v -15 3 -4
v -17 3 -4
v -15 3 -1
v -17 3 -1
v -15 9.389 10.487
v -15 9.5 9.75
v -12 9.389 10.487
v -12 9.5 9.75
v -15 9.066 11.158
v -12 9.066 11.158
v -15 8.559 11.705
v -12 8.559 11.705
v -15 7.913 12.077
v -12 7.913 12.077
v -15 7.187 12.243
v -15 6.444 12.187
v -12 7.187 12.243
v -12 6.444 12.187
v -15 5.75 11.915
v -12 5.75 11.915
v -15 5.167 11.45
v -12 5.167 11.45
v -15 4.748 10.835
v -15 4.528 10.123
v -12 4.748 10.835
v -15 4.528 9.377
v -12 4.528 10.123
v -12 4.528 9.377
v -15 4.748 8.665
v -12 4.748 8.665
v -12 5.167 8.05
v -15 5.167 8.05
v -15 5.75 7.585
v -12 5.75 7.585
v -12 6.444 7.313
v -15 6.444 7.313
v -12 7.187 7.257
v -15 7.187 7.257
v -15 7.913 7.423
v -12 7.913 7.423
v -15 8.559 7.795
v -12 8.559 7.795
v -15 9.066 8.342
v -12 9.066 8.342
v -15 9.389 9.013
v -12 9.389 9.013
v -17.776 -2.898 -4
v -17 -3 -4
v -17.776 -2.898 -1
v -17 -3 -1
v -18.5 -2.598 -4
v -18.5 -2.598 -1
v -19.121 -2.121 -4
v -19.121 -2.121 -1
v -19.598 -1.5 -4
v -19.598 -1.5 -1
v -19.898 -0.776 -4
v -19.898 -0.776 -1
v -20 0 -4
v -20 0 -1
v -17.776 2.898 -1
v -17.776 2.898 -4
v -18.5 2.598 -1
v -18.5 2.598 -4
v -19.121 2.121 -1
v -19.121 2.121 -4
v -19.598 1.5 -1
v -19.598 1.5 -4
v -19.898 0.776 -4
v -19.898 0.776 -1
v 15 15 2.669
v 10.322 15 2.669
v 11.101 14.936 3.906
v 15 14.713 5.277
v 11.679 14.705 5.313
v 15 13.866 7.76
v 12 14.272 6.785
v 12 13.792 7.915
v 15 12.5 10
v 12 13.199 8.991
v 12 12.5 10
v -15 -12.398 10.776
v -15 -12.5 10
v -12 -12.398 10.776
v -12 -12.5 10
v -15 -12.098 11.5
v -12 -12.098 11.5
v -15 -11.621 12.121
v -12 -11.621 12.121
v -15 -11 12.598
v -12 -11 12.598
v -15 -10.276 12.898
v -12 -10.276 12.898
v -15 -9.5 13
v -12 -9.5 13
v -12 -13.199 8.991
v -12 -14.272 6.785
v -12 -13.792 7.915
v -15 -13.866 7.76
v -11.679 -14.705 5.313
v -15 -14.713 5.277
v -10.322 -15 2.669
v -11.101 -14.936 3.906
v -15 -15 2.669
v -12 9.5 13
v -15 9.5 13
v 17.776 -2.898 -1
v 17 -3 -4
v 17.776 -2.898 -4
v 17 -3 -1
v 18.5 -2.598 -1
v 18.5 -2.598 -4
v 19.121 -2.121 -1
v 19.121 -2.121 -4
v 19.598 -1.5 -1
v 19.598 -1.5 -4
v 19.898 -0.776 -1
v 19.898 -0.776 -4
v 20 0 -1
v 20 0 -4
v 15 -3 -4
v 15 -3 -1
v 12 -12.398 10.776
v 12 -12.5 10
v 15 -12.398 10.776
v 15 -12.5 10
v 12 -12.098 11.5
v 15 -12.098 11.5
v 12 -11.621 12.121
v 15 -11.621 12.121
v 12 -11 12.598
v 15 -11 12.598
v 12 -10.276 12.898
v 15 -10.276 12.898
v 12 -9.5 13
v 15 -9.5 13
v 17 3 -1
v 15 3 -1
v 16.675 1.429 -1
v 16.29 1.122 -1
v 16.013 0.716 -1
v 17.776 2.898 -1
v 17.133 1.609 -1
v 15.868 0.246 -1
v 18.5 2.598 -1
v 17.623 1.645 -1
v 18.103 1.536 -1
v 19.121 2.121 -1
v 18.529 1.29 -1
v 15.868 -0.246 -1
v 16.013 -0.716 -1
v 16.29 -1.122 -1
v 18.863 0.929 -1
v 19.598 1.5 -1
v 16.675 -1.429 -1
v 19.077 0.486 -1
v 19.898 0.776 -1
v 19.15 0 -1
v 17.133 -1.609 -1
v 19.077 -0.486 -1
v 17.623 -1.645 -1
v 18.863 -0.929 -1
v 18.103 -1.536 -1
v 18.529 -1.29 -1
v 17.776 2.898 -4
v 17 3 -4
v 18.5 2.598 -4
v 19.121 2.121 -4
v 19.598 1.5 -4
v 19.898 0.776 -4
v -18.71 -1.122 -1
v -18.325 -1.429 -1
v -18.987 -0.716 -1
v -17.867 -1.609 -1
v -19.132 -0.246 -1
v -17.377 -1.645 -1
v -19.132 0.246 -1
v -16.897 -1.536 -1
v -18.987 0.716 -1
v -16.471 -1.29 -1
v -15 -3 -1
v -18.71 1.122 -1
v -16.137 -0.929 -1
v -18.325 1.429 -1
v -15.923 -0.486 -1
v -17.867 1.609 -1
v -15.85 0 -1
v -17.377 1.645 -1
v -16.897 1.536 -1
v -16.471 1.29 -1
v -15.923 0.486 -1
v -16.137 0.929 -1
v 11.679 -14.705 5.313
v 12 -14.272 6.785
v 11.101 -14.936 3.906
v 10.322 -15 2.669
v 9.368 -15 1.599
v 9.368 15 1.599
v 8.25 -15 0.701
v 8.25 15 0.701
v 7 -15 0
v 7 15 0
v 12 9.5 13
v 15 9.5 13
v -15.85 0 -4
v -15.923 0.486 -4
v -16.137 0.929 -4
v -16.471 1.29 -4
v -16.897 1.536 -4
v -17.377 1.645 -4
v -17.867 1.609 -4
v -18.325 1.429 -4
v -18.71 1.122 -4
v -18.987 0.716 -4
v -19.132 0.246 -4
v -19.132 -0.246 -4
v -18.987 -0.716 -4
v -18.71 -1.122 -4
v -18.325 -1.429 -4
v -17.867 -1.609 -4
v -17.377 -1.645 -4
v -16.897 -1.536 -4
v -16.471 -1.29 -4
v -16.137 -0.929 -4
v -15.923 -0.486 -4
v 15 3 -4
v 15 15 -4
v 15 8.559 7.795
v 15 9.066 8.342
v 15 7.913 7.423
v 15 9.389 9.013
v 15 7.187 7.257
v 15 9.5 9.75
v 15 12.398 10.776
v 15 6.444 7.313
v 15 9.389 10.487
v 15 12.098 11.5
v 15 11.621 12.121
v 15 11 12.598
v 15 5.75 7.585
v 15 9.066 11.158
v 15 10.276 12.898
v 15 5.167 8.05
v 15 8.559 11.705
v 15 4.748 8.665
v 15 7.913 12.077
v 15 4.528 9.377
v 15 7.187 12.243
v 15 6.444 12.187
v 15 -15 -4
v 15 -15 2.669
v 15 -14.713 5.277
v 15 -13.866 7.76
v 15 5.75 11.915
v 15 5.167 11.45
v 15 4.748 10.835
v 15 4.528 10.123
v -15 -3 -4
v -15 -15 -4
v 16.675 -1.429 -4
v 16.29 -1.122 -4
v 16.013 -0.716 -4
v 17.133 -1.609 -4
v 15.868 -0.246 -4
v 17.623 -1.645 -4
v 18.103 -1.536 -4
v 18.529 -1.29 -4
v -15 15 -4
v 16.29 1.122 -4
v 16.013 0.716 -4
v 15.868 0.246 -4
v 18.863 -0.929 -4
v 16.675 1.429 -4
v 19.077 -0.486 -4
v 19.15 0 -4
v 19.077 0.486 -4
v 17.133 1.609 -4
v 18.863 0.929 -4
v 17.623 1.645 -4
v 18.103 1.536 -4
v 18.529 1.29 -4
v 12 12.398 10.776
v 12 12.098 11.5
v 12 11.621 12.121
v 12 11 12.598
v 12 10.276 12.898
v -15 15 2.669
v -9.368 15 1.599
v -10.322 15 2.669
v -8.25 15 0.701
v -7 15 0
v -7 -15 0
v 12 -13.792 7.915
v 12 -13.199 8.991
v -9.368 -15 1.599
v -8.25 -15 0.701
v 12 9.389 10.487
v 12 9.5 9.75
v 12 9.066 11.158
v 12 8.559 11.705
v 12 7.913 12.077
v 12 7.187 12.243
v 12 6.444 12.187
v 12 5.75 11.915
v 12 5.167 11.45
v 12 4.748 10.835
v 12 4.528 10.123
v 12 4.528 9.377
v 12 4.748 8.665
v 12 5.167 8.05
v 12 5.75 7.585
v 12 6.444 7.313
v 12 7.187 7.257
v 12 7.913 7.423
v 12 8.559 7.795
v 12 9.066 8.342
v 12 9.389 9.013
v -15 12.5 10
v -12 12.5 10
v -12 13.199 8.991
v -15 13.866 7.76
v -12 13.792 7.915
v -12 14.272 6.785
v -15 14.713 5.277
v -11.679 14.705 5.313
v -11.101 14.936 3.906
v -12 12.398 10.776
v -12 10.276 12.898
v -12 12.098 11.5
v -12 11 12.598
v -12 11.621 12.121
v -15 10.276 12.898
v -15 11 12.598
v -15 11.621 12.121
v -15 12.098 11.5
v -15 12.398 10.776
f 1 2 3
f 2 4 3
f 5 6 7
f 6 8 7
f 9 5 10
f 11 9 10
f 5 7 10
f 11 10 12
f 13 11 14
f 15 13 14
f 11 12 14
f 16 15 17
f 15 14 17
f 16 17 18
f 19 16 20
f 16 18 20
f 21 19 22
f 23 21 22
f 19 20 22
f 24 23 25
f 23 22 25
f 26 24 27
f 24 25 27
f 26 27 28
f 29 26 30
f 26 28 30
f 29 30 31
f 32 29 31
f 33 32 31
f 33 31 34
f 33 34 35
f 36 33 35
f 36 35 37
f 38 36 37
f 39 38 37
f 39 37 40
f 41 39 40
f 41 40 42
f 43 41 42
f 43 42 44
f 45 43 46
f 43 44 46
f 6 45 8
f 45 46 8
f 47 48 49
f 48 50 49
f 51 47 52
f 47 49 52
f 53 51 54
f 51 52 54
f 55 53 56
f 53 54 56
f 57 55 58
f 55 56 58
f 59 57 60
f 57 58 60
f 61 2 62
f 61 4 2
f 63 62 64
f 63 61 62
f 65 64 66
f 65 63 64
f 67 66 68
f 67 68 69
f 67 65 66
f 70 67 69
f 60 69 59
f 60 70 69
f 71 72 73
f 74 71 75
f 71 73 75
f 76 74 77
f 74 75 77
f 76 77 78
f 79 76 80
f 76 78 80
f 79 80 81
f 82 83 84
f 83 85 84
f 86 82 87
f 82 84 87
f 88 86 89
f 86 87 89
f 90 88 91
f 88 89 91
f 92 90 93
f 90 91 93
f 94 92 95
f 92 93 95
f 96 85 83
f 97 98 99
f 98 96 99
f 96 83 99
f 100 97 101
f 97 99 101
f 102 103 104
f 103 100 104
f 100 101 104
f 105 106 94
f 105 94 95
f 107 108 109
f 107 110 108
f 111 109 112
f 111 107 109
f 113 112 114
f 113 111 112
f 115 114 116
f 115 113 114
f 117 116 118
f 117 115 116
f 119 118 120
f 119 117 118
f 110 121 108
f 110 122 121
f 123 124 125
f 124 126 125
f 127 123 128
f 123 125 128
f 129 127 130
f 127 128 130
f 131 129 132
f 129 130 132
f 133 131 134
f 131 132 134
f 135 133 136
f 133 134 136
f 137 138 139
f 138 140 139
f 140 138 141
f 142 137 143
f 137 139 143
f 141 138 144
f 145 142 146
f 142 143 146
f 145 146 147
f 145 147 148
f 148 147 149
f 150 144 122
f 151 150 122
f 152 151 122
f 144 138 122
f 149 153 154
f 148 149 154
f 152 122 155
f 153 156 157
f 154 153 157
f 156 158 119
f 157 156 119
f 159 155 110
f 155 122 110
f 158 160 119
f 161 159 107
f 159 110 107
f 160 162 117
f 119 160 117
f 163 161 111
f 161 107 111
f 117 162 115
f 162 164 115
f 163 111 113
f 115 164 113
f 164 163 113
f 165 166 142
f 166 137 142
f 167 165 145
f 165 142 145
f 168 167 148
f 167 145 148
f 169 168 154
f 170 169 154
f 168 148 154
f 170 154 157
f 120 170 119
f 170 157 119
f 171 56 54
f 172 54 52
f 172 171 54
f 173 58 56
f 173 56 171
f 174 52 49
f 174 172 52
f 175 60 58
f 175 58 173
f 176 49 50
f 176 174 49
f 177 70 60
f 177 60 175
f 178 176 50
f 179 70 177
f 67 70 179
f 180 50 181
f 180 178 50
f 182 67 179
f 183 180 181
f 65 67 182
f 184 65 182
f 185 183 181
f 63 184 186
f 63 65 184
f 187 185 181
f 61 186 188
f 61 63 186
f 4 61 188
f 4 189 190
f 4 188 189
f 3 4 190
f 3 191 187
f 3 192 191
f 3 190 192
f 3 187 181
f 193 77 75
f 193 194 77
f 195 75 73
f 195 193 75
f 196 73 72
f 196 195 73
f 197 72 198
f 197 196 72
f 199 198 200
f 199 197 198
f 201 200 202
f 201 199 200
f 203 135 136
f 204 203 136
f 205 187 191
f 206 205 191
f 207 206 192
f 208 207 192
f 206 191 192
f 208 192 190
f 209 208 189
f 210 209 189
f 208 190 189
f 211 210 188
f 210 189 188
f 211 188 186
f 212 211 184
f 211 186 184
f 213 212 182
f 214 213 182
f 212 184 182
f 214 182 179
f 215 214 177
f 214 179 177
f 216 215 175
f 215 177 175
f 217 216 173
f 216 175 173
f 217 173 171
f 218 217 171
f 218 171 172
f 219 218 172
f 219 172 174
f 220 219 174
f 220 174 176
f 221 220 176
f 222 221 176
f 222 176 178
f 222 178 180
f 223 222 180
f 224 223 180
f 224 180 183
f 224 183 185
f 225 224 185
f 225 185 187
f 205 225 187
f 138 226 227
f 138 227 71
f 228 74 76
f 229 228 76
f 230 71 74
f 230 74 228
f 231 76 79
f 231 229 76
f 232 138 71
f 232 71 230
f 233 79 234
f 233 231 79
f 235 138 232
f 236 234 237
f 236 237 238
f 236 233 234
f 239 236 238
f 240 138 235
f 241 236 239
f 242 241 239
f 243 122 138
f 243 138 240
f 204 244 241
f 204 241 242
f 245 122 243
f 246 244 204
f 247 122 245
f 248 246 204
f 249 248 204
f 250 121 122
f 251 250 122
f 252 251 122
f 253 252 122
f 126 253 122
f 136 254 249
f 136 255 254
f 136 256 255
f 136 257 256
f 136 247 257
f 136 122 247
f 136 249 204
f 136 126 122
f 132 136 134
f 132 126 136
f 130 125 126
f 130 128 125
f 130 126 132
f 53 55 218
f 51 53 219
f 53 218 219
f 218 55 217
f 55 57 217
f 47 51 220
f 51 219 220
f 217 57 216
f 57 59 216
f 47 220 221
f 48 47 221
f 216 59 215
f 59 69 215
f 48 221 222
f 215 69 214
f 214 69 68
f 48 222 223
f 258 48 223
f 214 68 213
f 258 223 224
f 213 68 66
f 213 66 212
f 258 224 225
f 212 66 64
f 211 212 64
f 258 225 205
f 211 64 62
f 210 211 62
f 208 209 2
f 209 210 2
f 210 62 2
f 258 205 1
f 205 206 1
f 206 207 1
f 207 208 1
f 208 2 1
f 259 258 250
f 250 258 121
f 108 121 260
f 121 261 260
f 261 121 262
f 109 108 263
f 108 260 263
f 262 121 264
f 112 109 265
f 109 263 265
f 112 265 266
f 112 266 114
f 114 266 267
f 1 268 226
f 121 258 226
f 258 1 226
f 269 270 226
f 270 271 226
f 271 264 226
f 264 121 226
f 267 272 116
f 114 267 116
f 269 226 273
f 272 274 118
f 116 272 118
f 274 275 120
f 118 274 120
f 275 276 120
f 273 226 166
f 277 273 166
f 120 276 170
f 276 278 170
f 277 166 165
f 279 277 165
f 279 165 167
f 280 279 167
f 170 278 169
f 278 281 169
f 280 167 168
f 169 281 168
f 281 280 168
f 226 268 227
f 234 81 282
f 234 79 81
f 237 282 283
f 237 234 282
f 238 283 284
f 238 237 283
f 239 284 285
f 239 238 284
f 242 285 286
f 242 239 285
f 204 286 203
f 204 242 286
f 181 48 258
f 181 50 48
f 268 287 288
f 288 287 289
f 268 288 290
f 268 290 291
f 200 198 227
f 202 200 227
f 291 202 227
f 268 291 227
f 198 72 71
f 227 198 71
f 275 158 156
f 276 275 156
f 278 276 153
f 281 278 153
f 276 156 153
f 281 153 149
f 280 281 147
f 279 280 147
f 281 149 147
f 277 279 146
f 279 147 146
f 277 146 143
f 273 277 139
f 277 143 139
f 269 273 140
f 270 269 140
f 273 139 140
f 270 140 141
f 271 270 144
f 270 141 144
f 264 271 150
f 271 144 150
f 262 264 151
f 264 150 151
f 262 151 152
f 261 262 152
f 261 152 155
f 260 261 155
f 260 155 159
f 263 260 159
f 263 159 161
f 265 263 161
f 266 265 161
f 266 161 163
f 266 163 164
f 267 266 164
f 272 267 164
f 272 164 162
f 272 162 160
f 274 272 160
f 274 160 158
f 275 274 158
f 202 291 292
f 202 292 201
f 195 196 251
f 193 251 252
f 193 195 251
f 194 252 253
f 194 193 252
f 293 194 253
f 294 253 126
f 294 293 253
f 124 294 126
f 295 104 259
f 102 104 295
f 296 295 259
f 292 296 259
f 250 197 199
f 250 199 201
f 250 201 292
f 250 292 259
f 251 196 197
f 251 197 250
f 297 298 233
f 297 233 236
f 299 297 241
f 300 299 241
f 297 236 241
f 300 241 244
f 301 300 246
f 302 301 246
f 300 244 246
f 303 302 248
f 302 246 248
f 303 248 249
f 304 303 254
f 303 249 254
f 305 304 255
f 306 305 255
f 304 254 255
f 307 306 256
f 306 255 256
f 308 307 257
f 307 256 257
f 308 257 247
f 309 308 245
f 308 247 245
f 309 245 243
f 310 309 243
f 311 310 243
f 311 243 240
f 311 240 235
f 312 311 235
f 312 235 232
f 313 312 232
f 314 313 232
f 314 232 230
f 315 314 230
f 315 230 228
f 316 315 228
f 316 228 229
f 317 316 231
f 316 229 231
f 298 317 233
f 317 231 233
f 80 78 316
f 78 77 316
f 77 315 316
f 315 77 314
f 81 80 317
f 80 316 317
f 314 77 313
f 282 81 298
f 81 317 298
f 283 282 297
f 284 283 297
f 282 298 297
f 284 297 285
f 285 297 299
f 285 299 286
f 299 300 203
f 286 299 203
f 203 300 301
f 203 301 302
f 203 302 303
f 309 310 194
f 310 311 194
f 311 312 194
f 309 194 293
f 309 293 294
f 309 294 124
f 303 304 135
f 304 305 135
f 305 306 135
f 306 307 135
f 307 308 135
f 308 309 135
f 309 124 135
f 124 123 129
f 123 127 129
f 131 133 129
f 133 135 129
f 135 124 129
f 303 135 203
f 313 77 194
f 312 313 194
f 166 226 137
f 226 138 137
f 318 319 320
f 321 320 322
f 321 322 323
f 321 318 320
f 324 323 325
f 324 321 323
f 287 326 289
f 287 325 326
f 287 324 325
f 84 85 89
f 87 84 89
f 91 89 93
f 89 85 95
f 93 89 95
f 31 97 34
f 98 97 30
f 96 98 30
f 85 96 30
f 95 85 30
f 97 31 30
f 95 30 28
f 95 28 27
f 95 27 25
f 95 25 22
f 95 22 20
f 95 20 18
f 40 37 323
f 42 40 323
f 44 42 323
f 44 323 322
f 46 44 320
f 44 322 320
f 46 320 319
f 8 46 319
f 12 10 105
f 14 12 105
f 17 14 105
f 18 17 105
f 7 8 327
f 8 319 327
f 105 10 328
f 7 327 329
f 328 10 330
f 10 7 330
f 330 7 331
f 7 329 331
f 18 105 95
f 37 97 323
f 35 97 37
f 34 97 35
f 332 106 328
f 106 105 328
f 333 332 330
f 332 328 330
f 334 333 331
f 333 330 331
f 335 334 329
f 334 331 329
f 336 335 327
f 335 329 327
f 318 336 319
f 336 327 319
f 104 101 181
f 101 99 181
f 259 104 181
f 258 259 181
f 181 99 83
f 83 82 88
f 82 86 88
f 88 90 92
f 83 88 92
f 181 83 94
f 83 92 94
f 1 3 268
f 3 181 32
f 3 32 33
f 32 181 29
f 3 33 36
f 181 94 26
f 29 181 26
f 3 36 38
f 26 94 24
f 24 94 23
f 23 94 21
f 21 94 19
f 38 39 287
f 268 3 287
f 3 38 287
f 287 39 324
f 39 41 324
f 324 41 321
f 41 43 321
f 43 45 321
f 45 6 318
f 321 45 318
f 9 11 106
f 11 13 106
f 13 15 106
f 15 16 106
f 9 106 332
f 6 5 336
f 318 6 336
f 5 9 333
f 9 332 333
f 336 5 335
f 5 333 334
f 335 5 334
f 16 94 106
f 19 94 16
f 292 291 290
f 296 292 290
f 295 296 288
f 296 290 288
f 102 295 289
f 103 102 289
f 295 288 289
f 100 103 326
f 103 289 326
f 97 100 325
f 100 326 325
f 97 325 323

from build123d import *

# Parameters (mm, degrees)
F0_W         = 30
F0_H         = 30
F1_DEPTH     = 4
F2_W         = 3
F2_H         = 10
F3_DEPTH     = 15
F5_DEPTH     = 15
F6_W         = 5
F6_H         = 3
F7_DEPTH     = 3
F8_R         = 2.99999
F9_R         = 1.65
F10_DEPTH    = 25
F11_W        = 3
F11_H        = 3
F12_DEPTH    = 12.5
F13_R        = 2.99999
F14_R        = 2.5
F15_DEPTH    = 18.8
F16_T1_DEPTH = 39.6571957465
F16_T3_DEPTH = 39.6571957465


# Not quite as in the source:
# - a fillet or chamfer that OpenCascade refuses, or shapes differently, is made with other operations: its cross-section is extruded or revolved along the edge and cut away or added
# - a fillet or chamfer is up to 0.001 mm smaller than in the source, because OpenCascade refuses the exact size


with BuildPart() as f1:
    # F0 (on Top) → F1 (new body)
    with BuildSketch(Plane.XY):
        Rectangle(F0_W, F0_H)
    extrude(amount=-F1_DEPTH)

    # F2 (on Front) → F3 (join, symmetric)
    with BuildSketch(Plane.XZ):
        with Locations((-13.5, 5)):
            Rectangle(F2_W, F2_H)
        with Locations((13.5, 5)):
            Rectangle(F2_W, F2_H)
    extrude(amount=F3_DEPTH, both=True)

    # F4 (on Front) → F5 (join, symmetric)
    with BuildSketch(Plane.XZ):
        with BuildLine():
            Line((-12, 6.7849478247), (-12, 9))
            ThreePointArc((-12, 9), (-12.0709686948, 7.8924739124), (-12, 6.7849478247))
        make_face()
        with BuildLine():
            ThreePointArc((-7, 0), (-10.3790782907, 2.7446588419), (-12, 6.7849478247))
            Line((-12, 6.7849478247), (-12, 0))
            Line((-12, 0), (-7, 0))
        make_face()
        with BuildLine():
            Line((12, 0), (12, 6.7849478247))
            ThreePointArc((12, 6.7849478247), (10.3790782907, 2.7446588419), (7, 0))
            Line((7, 0), (12, 0))
        make_face()
        with BuildLine():
            ThreePointArc((12, 6.7849478247), (12.0709686948, 7.8924739124), (12, 9))
            Line((12, 9), (12, 6.7849478247))
        make_face()
    extrude(amount=F5_DEPTH, both=True)

    # F6 (on Front) → F7 (join, symmetric)
    with BuildSketch(Plane.XZ):
        with Locations((-17.5, -2.5)):
            Rectangle(F6_W, F6_H)
        with Locations((17.5, -2.5)):
            Rectangle(F6_W, F6_H)
    extrude(amount=F7_DEPTH, both=True)

    # F8 (radius 3 in the source; OpenCascade refuses exactly that, so slightly less here)
    f8_edges = [f1.edges().sort_by_distance(p)[0] for p in [
        (-20, 3, -2.5),
        (-20, -3, -2.5),
        (20, 3, -2.5),
        (20, -3, -2.5),
    ]]
    fillet(f8_edges, radius=F8_R)

    # F9 (on Top) → F10 (cut)
    with BuildSketch(Plane.XY):
        with Locations((-17.5, 0)):
            Circle(F9_R)
        with Locations((17.5, 0)):
            Circle(F9_R)
    extrude(amount=-F10_DEPTH, mode=Mode.SUBTRACT)

    # F11 (on Front) → F12 (join, symmetric)
    with BuildSketch(Plane.XZ):
        with Locations((-13.5, 11.5)):
            Rectangle(F11_W, F11_H)
        with Locations((13.5, 11.5)):
            Rectangle(F11_W, F11_H)
    extrude(amount=F12_DEPTH, both=True)

    # F13 (radius 3 in the source; OpenCascade refuses exactly that, so slightly less here)
    f13_edges = [f1.edges().sort_by_distance(p)[0] for p in [
        (-13.5, -12.5, 13),
        (-13.5, 12.5, 13),
        (13.5, -12.5, 13),
        (13.5, 12.5, 13),
    ]]
    fillet(f13_edges, radius=F13_R)

    # F14 (on Right) → F15 (cut, symmetric)
    with BuildSketch(Plane.YZ):
        with Locations((7, 9.75)):
            Circle(F14_R)
    extrude(amount=F15_DEPTH, both=True, mode=Mode.SUBTRACT)

    # F16: fillet of radius 12 on 4 edges, made by hand

    # F16_s2 → F16_t1 (cut)
    with BuildSketch(Plane.YZ.offset(-6.3285978733)):
        with BuildLine():
            ThreePointArc((15, 2.6685608507), (14.3578166916, 6.5415441969), (12.5, 10))
            Line((12.5, 10), (15, 10))
            Line((15, 10), (15, 2.6685608507))
        make_face()
        with BuildLine():
            ThreePointArc((-15, 2.6685608507), (-14.3578166916, 6.5415441969), (-12.5, 10))
            Line((-12.5, 10), (-15, 10))
            Line((-15, 10), (-15, 2.6685608507))
        make_face()
    extrude(amount=F16_T1_DEPTH, mode=Mode.SUBTRACT)

    # F16_s4 → F16_t3 (cut)
    with BuildSketch(Plane.YZ.offset(-33.3285978733)):
        with BuildLine():
            ThreePointArc((-12.5, 10), (-14.3578166916, 6.5415441969), (-15, 2.6685608507))
            Line((-15, 2.6685608507), (-15, 10))
            Line((-15, 10), (-12.5, 10))
        make_face()
        with BuildLine():
            ThreePointArc((12.5, 10), (14.3578166916, 6.5415441969), (15, 2.6685608507))
            Line((15, 2.6685608507), (15, 10))
            Line((15, 10), (12.5, 10))
        make_face()
    extrude(amount=F16_T3_DEPTH, mode=Mode.SUBTRACT)


solid = f1.part
